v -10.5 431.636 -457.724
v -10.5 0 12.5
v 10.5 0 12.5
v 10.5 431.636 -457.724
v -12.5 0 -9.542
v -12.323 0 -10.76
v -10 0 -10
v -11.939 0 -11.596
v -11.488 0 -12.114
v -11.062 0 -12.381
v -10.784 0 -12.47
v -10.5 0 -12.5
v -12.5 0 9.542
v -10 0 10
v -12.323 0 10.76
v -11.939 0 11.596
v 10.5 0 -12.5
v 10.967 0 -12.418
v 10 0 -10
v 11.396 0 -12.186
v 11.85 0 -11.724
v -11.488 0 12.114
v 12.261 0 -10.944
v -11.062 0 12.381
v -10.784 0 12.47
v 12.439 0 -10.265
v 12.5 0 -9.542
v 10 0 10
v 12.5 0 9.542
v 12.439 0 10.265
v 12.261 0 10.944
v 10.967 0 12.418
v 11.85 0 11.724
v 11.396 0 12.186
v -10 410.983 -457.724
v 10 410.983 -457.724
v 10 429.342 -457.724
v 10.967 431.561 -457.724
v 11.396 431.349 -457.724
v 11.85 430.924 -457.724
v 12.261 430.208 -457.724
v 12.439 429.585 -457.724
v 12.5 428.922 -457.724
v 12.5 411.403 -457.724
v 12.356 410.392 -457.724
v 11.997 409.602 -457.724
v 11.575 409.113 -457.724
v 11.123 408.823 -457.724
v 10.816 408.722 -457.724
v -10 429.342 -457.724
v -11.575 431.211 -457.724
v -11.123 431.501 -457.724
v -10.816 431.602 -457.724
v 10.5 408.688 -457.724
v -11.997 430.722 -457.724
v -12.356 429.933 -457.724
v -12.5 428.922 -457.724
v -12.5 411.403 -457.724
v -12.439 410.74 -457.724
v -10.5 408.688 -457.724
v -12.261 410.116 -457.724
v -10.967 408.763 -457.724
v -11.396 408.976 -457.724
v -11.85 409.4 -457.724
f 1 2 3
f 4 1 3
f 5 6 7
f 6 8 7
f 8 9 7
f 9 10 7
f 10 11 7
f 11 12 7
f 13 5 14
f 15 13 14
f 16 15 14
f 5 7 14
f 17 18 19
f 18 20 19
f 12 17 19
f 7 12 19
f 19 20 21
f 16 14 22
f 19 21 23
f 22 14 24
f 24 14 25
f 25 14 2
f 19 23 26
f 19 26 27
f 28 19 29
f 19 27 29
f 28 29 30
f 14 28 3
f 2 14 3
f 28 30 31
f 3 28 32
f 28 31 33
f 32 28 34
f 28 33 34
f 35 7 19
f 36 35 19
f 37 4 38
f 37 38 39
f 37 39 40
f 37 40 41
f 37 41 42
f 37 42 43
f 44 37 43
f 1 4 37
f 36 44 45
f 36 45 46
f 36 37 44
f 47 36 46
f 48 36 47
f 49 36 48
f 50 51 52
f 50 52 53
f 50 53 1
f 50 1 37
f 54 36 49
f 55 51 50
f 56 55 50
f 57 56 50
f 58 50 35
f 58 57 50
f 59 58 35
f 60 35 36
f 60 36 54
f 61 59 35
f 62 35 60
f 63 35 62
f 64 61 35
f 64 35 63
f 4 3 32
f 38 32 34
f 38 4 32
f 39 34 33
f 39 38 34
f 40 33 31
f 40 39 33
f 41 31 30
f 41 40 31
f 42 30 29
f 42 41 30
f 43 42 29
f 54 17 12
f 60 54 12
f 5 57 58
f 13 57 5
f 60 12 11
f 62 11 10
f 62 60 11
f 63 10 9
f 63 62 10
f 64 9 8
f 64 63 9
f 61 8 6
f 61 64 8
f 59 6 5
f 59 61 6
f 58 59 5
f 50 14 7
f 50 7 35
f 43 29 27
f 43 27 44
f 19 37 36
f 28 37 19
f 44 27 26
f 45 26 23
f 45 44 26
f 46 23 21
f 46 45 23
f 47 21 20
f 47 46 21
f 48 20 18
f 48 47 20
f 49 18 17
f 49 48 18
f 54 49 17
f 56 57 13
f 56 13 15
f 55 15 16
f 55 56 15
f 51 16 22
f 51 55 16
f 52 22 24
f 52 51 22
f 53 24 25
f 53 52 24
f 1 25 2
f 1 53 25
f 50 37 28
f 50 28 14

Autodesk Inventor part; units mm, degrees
ref_plane "YZ Plane" through (0, 0, 0) normal (1, 0, 0) x (0, 1, 0)
sketch "profile" plane through (0, 0, 0) normal (0, 1, 0) x (-1, 0, 0)
  line L0 (12.5, 12.5) -> (-12.5, 12.5)
  line L1 (-12.5, 12.5) -> (-12.5, -12.5)
  line L2 (-12.5, -12.5) -> (12.5, -12.5)
  line L3 (12.5, -12.5) -> (12.5, 12.5)
  line L4 (-10, -10) -> (-10, 10)
  line L5 (-10, 10) -> (10, 10)
  line L6 (10, 10) -> (10, -10)
  line L7 (10, -10) -> (-10, -10)
  point P0 (0, 0)
  dimension "d0" = 12.5
  dimension "d1" = 25
  dimension "d2" = 25
  dimension "d3" = 12.5
  dimension "d6" = 2.5
sketch3d "3D Sketch1"
  line L0 (0, 0, 0) -> (0, 477.6365, -520.3364)
  dimension "d4" = 706.319
  dimension "d5" = 42.55
sweep "Sweep1" add profiles "profile" path "3D Sketch1"
fillet "Fillet1" radius 2 4 edges at (-12.5, 238.8182, -272.6682) (-12.5, 238.8182, -247.6682) (12.5, 238.8182, -247.6682) (12.5, 238.8182, -272.6682)
ref_plane "Work Plane2" through (-10.5, 431.6365, -532.8364) normal (0, 1, 0) x (1, 0, 0)
split "Split2" plane through (-10.5, 431.6365, -532.8364) removes the side toward (0, 1, 0)
ref_plane "Work Plane3" through (0, 431.6365, -457.724) normal (0, 0, 1) x (1, 0, 0)
split "Split3" plane through (0, 431.6365, -457.724) removes the side toward (0, 0, -1)
equation "\"d0\" = 0.5 * d1"
equation "\"d1\" = width"
equation "\"d2\" = d1"
equation "\"d3\" = 0.5 * d2"
equation "\"d6\" = t"
equation "\"d4\" = L"
equation "\"d5\" = angle"
equation "\"d9\" = filletRadius"
equation "\"L\" = 706.319"
equation "\"t\" = 2.5"
equation "\"filletRadius\" = 2"
equation "\"angle\" = 42.55deg"
equation "\"width\" = 25"
properties part number "support_truss2" material "Steel, Galvanized"
